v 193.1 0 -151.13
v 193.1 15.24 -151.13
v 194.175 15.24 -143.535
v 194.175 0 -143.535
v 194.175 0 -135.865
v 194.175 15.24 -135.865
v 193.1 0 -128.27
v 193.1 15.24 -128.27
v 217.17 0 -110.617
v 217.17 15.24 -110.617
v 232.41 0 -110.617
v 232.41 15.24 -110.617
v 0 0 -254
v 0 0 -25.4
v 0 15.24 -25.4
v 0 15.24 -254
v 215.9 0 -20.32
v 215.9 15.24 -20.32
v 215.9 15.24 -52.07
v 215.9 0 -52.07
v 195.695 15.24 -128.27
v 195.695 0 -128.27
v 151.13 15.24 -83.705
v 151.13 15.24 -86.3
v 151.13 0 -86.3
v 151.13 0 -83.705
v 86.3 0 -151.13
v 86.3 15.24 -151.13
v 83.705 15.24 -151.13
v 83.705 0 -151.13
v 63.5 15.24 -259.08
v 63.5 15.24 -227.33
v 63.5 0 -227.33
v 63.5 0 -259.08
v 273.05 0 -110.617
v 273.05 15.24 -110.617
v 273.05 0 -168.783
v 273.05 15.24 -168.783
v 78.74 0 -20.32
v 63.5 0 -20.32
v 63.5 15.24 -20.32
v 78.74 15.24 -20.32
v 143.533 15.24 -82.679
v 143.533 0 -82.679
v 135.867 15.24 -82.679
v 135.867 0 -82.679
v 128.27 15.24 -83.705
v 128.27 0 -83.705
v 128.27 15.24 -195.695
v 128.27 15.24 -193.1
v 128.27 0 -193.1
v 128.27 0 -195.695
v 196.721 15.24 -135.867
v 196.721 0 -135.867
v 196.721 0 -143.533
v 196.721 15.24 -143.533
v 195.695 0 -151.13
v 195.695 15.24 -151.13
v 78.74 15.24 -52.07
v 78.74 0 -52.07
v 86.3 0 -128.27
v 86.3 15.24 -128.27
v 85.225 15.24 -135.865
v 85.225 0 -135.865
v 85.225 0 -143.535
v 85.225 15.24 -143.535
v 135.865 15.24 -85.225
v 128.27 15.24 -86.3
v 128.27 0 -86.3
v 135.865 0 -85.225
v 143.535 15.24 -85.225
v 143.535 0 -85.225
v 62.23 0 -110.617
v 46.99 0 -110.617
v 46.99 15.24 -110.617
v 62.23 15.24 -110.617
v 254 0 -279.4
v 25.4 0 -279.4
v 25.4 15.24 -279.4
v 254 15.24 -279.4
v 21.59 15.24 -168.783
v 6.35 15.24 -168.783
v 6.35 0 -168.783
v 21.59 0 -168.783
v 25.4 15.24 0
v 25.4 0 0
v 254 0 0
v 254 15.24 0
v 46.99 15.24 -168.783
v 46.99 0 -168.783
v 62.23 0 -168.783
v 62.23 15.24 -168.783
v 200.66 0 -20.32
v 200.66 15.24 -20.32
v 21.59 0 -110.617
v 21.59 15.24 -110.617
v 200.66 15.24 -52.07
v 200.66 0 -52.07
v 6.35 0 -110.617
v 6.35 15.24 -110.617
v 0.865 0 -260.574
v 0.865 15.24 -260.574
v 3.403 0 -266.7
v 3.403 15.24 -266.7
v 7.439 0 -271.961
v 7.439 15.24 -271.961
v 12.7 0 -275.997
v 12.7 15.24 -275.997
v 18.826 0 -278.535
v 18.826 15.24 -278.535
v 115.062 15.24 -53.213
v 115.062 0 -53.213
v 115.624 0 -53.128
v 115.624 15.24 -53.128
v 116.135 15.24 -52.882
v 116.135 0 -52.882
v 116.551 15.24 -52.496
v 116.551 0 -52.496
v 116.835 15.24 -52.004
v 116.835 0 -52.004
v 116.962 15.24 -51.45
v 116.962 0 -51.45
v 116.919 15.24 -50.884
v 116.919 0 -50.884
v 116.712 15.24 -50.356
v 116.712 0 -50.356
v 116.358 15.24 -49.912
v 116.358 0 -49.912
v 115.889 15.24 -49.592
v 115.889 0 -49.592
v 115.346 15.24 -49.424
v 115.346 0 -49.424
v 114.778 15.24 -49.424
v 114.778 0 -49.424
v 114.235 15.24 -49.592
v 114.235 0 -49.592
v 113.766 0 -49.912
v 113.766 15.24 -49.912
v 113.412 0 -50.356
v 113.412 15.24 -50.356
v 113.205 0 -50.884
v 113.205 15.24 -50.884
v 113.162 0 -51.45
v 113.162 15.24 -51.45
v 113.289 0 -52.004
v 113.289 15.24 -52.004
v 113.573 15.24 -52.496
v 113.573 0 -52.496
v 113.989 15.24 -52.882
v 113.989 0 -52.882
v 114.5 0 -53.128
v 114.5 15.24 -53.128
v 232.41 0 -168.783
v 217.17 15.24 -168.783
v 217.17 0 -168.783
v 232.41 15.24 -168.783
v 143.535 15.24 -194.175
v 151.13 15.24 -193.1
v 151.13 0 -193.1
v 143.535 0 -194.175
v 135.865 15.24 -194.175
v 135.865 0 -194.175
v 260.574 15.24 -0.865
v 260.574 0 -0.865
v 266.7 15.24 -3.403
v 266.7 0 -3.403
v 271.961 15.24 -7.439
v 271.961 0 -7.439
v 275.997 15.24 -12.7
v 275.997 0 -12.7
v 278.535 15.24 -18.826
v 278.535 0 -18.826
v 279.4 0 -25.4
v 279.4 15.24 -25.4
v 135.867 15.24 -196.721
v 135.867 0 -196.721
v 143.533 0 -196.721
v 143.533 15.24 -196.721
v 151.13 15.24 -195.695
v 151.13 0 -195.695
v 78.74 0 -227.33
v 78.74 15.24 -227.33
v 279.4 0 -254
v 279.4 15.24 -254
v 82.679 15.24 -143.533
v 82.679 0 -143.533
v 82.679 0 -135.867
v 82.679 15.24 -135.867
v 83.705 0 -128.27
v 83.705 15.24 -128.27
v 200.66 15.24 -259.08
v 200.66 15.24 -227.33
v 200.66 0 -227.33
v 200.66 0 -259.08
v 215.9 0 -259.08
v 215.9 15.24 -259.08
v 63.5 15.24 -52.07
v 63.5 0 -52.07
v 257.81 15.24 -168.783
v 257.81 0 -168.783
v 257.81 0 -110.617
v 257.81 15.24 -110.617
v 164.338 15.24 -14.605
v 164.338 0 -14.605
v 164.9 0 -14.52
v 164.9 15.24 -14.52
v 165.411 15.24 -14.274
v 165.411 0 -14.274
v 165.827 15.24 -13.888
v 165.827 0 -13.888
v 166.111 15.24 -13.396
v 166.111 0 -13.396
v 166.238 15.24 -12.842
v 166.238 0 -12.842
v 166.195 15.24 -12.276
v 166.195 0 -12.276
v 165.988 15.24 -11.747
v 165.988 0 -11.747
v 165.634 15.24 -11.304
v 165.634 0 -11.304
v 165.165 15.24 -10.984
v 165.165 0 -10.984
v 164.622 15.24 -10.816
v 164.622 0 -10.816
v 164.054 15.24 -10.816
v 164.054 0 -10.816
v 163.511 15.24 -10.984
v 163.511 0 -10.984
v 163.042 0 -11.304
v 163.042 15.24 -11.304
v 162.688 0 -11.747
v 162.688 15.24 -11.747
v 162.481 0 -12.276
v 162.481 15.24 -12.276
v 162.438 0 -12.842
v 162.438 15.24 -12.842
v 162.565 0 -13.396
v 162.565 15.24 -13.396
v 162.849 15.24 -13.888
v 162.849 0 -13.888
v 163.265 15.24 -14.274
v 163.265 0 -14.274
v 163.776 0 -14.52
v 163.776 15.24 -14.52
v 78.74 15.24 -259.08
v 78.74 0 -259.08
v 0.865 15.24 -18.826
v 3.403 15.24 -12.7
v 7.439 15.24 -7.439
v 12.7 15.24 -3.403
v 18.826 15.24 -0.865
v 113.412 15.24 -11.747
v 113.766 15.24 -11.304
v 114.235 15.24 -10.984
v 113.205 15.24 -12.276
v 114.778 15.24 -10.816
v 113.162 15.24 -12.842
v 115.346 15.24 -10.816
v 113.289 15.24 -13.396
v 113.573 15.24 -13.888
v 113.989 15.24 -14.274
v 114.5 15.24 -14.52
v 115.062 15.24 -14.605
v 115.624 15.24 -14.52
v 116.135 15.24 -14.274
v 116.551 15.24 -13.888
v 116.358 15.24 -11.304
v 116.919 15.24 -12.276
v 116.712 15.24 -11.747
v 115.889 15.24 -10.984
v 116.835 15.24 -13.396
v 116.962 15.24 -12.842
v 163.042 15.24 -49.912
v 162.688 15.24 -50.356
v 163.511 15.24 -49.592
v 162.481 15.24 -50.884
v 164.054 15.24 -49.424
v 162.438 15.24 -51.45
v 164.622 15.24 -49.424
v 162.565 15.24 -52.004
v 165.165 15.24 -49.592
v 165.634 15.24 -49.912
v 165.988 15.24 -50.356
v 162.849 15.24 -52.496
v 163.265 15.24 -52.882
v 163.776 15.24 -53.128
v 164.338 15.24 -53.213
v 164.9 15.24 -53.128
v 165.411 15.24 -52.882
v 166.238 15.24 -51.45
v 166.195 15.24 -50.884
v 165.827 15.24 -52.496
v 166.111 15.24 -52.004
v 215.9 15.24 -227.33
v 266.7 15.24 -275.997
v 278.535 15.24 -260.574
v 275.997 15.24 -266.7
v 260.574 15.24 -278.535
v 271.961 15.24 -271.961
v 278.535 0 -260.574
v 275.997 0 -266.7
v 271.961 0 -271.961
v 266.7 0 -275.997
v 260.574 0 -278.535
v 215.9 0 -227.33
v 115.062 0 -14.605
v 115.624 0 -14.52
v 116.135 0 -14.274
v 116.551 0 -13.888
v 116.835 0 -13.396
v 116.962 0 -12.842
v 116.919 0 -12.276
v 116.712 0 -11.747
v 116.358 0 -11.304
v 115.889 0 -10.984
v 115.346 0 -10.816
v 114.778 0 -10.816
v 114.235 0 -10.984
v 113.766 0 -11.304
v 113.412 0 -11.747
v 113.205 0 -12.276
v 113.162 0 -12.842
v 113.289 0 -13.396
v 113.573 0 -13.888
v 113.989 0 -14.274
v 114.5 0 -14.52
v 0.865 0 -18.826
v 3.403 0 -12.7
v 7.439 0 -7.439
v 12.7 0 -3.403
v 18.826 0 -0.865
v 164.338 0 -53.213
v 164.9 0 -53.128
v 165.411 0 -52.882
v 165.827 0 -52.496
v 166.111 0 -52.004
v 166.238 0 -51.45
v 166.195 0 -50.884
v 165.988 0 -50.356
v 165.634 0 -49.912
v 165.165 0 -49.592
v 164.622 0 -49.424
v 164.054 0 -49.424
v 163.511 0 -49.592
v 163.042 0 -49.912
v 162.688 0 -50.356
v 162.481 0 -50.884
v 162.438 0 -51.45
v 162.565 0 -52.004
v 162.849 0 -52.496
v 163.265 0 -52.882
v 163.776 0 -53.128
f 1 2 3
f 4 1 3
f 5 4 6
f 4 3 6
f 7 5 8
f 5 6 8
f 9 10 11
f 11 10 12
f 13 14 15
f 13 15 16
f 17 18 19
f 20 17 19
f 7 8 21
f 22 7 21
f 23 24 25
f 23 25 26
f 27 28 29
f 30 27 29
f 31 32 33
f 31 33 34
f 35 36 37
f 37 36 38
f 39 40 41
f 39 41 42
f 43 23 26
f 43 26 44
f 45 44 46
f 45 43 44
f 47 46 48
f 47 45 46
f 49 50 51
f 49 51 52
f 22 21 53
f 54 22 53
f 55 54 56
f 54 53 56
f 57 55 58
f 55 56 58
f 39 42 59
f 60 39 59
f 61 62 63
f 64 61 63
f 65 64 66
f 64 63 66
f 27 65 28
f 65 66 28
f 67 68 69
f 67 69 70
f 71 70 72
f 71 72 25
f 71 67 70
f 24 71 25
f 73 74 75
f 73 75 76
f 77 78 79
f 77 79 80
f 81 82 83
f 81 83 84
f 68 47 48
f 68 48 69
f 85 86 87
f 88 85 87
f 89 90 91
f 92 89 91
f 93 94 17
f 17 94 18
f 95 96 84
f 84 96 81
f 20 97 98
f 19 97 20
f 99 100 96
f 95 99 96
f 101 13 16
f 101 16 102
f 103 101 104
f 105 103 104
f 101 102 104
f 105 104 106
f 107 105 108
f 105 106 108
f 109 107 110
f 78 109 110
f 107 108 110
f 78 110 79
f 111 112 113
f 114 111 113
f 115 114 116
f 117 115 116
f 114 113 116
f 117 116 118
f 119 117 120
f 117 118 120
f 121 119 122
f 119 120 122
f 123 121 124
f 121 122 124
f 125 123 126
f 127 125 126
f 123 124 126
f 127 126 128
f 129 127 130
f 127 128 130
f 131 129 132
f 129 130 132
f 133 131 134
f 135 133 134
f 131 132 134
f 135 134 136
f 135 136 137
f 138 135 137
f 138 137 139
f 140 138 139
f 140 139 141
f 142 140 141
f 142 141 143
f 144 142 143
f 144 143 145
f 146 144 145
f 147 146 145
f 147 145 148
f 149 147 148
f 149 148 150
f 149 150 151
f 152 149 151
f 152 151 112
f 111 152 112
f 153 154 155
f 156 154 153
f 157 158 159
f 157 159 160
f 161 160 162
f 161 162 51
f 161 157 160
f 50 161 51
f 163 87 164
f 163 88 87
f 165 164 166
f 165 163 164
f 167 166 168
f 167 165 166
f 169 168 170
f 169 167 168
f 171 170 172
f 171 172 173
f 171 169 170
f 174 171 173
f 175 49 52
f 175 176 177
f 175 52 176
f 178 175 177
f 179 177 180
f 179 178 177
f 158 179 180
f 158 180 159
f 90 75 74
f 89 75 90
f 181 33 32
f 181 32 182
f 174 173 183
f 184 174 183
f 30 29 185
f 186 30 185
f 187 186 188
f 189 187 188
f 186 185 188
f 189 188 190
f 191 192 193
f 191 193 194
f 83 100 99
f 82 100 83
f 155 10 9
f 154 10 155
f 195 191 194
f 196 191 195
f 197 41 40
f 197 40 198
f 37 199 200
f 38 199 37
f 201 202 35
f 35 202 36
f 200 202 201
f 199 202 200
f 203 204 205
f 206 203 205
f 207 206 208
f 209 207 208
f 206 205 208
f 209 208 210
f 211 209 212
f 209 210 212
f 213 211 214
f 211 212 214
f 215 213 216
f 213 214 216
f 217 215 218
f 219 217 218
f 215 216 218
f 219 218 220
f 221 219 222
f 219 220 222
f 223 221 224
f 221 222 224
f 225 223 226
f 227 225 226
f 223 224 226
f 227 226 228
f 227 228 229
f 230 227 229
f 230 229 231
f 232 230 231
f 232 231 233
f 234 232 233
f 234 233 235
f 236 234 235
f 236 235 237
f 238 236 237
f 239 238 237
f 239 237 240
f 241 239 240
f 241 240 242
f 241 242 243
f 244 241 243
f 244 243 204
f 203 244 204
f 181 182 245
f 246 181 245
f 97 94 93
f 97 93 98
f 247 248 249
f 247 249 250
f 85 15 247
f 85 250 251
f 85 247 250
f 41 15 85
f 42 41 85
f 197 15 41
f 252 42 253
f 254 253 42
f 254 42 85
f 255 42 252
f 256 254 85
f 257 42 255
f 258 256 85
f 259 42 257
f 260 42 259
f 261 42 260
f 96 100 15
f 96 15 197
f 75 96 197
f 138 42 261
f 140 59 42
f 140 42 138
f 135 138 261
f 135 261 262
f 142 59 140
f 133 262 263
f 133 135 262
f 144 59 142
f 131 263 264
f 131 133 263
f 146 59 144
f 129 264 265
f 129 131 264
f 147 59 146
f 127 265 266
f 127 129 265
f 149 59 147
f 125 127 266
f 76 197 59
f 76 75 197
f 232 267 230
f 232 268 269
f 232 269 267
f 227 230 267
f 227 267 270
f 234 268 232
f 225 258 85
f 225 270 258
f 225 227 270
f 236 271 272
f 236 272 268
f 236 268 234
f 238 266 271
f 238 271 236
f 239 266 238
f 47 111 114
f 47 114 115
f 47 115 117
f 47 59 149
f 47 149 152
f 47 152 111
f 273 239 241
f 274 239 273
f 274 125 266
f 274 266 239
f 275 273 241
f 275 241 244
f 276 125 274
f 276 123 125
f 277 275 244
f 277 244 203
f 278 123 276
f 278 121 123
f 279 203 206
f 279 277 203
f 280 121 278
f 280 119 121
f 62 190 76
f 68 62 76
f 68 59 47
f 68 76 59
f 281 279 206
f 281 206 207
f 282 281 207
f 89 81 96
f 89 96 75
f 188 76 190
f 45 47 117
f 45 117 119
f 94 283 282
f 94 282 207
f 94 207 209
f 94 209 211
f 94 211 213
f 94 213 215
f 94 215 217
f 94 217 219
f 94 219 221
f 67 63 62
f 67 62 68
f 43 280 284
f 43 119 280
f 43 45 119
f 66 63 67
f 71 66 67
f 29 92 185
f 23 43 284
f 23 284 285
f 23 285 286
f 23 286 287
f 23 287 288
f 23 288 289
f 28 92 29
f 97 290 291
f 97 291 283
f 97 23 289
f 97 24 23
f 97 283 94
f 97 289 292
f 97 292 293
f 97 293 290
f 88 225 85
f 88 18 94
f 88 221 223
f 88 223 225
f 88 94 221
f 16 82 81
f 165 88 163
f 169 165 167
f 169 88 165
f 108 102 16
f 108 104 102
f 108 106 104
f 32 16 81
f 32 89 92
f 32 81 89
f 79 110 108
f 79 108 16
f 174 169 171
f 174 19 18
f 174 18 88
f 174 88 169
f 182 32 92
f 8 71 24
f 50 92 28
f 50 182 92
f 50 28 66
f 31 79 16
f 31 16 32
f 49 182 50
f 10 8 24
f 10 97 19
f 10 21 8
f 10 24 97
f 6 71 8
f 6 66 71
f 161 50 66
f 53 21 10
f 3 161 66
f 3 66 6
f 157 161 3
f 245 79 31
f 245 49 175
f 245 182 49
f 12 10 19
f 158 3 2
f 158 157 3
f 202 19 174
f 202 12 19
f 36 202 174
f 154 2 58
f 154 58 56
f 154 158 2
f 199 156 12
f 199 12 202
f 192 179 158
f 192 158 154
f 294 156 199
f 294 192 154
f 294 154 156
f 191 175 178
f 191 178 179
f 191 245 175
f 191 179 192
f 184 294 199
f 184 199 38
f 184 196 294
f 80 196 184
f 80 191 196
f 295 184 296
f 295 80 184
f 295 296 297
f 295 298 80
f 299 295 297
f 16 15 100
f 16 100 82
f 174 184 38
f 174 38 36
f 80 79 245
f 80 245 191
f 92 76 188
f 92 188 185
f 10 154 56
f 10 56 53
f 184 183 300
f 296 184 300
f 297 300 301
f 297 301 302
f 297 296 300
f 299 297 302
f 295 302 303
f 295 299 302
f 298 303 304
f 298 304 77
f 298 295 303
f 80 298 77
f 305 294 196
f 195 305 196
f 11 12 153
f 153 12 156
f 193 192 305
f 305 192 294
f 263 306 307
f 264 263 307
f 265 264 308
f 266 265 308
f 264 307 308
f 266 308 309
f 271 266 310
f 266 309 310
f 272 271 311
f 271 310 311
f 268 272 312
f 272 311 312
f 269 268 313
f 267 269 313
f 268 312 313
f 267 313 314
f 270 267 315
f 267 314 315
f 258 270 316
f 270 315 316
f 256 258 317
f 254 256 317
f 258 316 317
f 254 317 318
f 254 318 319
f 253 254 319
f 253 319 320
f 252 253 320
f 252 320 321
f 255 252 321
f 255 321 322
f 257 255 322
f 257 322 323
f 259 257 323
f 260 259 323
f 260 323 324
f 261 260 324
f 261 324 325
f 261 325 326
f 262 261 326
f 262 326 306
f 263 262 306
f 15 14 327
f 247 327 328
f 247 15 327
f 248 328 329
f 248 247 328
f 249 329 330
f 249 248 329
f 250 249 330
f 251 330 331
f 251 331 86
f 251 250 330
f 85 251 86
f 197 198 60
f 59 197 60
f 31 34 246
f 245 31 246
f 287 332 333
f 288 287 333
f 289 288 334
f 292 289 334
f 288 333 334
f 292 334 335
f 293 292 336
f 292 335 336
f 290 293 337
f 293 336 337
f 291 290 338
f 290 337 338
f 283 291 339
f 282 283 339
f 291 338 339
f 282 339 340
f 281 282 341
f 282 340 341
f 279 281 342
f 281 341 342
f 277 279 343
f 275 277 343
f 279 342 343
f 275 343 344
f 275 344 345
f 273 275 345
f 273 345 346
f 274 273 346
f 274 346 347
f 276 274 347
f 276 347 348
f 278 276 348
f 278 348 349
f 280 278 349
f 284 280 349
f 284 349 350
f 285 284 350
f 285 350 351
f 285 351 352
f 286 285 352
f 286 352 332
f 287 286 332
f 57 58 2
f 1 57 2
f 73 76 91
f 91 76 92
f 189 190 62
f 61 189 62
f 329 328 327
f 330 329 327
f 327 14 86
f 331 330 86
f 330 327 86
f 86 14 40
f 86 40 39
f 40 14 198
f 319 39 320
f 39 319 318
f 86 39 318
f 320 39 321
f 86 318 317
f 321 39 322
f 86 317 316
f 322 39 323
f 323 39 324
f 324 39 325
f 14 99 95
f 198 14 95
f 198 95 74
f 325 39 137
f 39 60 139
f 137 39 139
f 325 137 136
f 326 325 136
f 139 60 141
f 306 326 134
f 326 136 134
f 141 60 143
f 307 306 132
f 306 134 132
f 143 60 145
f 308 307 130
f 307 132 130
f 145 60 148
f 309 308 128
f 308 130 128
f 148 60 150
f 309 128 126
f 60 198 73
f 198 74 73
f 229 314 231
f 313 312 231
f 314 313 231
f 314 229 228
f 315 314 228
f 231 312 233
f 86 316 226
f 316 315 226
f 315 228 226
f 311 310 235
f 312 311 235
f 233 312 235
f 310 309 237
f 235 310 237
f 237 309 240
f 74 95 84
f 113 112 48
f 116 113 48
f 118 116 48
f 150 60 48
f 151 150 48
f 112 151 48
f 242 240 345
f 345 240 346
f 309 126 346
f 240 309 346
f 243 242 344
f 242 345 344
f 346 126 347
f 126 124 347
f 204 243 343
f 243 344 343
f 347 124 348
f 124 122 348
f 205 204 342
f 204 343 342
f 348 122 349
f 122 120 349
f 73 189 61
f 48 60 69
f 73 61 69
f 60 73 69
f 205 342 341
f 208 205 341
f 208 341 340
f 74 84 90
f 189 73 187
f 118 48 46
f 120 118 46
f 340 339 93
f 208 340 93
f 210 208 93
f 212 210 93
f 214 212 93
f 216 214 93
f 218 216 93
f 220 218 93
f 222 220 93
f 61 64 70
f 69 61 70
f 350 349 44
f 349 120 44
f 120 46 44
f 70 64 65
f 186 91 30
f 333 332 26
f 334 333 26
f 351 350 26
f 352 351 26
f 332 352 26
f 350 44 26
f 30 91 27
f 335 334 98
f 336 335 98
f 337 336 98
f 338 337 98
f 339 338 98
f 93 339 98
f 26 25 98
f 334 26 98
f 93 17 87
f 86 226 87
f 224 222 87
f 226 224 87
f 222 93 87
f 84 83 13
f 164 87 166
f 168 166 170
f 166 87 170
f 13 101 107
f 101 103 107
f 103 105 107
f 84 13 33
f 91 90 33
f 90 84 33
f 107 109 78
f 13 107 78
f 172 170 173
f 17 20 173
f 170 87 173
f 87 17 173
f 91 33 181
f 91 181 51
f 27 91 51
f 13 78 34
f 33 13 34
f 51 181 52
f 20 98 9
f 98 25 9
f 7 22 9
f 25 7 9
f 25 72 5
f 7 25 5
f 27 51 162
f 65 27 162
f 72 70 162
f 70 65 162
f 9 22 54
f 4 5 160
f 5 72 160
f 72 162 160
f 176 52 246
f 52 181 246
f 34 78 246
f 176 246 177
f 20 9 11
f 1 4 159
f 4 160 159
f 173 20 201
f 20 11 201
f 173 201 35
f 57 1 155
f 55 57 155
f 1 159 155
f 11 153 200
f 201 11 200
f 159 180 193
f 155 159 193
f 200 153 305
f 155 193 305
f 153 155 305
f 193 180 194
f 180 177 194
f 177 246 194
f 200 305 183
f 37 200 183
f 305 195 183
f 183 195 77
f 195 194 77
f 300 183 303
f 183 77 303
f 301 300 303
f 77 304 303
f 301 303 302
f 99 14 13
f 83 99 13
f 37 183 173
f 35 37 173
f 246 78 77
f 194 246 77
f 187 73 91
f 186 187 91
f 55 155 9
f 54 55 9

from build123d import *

# Parameters (mm, degrees)
SKETCH1_W           = 279.4
SKETCH1_H           = 279.4
BOSS_EXTRUDE1_DEPTH = 15.24
FILLET1_R           = 25.4
SKETCH2_W           = 15.24
SKETCH2_H           = 31.75
CUT_EXTRUDE1_DEPTH  = 396.425059398
SKETCH3_W           = 15.24
SKETCH3_H           = 58.166
CUT_EXTRUDE2_DEPTH  = 396.425059398
SKETCH5_R           = 1.905
CUT_EXTRUDE4_DEPTH  = 396.425059398
CUT_EXTRUDE5_DEPTH  = 396.425059398


with BuildPart() as part:
    # Sketch1 → Boss-Extrude1 (new body)
    with BuildSketch(Plane(origin=(0, 0, 0), x_dir=(1, 0, 0), z_dir=(0, 1, 0))):
        with Locations((139.7, 139.7)):
            Rectangle(SKETCH1_W, SKETCH1_H)
    extrude(amount=BOSS_EXTRUDE1_DEPTH)

    # Fillet1
    fillet1_edges = [part.edges().sort_by_distance(p)[0] for p in [
        (0, 7.62, -279.4),
        (279.4, 7.62, -279.4),
        (279.4, 7.62, 0),
        (0, 7.62, 0),
    ]]
    fillet(fillet1_edges, radius=FILLET1_R)

    # Sketch2 → Cut-Extrude1 (cut, through all)
    with BuildSketch(Plane(origin=(0, 15.24, 0), x_dir=(1, 0, 0), z_dir=(0, 1, 0))):
        with Locations((71.12, 243.205)):
            Rectangle(SKETCH2_W, SKETCH2_H)
        with Locations((208.28, 243.205)):
            Rectangle(SKETCH2_W, SKETCH2_H)
        with Locations((71.12, 36.195)):
            Rectangle(SKETCH2_W, SKETCH2_H)
        with Locations((208.28, 36.195)):
            Rectangle(SKETCH2_W, SKETCH2_H)
    extrude(amount=-CUT_EXTRUDE1_DEPTH, mode=Mode.SUBTRACT)

    # Sketch3 → Cut-Extrude2 (cut, through all)
    with BuildSketch(Plane(origin=(0, 15.24, 0), x_dir=(1, 0, 0), z_dir=(0, 1, 0))):
        with Locations((13.97, 139.7)):
            Rectangle(SKETCH3_W, SKETCH3_H)
        with Locations((265.43, 139.7)):
            Rectangle(SKETCH3_W, SKETCH3_H)
        with Locations((54.61, 139.7)):
            Rectangle(SKETCH3_W, SKETCH3_H)
        with Locations((224.79, 139.7)):
            Rectangle(SKETCH3_W, SKETCH3_H)
    extrude(amount=-CUT_EXTRUDE2_DEPTH, mode=Mode.SUBTRACT)

    # Sketch5 → Cut-Extrude4 (cut, through all)
    with BuildSketch(Plane.XZ):
        with Locations(Location((115.062, -12.7, 0), (0, 0, 270))):
            Circle(SKETCH5_R)
        with Locations(Location((164.338, -12.7, 0), (0, 0, 270))):
            Circle(SKETCH5_R)
        with Locations(Location((164.338, -51.308, 0), (0, 0, 270))):
            Circle(SKETCH5_R)
        with Locations(Location((115.062, -51.308, 0), (0, 0, 270))):
            Circle(SKETCH5_R)
    extrude(amount=-CUT_EXTRUDE4_DEPTH, mode=Mode.SUBTRACT)

    # Sketch6 → Cut-Extrude5 (cut, through all)
    with BuildSketch(Plane(origin=(0, 15.24, 0), x_dir=(1, 0, 0), z_dir=(0, 1, 0))):
        with BuildLine():
            Line((83.70466448, 128.27), (86.299558054, 128.27))
            ThreePointArc((86.299558054, 128.27), (85.09, 139.7), (86.299558054, 151.13))
            Line((86.299558054, 151.13), (83.70466448, 151.13))
            ThreePointArc((83.70466448, 151.13), (82.55, 139.7), (83.70466448, 128.27))
        make_face()
        with BuildLine():
            Line((128.27, 193.100441946), (128.27, 195.69533552))
            ThreePointArc((128.27, 195.69533552), (139.7, 196.85), (151.13, 195.69533552))
            Line((151.13, 195.69533552), (151.13, 193.100441946))
            ThreePointArc((151.13, 193.100441946), (139.7, 194.31), (128.27, 193.100441946))
        make_face()
        with BuildLine():
            Line((193.100441946, 128.27), (195.69533552, 128.27))
            ThreePointArc((195.69533552, 128.27), (196.85, 139.7), (195.69533552, 151.13))
            Line((195.69533552, 151.13), (193.100441946, 151.13))
            ThreePointArc((193.100441946, 151.13), (194.31, 139.7), (193.100441946, 128.27))
        make_face()
        with BuildLine():
            Line((151.13, 86.299558054), (151.13, 83.70466448))
            ThreePointArc((151.13, 83.70466448), (139.7, 82.55), (128.27, 83.70466448))
            Line((128.27, 83.70466448), (128.27, 86.299558054))
            ThreePointArc((128.27, 86.299558054), (139.7, 85.09), (151.13, 86.299558054))
        make_face()
    extrude(amount=-CUT_EXTRUDE5_DEPTH, mode=Mode.SUBTRACT)


solid = part.part
